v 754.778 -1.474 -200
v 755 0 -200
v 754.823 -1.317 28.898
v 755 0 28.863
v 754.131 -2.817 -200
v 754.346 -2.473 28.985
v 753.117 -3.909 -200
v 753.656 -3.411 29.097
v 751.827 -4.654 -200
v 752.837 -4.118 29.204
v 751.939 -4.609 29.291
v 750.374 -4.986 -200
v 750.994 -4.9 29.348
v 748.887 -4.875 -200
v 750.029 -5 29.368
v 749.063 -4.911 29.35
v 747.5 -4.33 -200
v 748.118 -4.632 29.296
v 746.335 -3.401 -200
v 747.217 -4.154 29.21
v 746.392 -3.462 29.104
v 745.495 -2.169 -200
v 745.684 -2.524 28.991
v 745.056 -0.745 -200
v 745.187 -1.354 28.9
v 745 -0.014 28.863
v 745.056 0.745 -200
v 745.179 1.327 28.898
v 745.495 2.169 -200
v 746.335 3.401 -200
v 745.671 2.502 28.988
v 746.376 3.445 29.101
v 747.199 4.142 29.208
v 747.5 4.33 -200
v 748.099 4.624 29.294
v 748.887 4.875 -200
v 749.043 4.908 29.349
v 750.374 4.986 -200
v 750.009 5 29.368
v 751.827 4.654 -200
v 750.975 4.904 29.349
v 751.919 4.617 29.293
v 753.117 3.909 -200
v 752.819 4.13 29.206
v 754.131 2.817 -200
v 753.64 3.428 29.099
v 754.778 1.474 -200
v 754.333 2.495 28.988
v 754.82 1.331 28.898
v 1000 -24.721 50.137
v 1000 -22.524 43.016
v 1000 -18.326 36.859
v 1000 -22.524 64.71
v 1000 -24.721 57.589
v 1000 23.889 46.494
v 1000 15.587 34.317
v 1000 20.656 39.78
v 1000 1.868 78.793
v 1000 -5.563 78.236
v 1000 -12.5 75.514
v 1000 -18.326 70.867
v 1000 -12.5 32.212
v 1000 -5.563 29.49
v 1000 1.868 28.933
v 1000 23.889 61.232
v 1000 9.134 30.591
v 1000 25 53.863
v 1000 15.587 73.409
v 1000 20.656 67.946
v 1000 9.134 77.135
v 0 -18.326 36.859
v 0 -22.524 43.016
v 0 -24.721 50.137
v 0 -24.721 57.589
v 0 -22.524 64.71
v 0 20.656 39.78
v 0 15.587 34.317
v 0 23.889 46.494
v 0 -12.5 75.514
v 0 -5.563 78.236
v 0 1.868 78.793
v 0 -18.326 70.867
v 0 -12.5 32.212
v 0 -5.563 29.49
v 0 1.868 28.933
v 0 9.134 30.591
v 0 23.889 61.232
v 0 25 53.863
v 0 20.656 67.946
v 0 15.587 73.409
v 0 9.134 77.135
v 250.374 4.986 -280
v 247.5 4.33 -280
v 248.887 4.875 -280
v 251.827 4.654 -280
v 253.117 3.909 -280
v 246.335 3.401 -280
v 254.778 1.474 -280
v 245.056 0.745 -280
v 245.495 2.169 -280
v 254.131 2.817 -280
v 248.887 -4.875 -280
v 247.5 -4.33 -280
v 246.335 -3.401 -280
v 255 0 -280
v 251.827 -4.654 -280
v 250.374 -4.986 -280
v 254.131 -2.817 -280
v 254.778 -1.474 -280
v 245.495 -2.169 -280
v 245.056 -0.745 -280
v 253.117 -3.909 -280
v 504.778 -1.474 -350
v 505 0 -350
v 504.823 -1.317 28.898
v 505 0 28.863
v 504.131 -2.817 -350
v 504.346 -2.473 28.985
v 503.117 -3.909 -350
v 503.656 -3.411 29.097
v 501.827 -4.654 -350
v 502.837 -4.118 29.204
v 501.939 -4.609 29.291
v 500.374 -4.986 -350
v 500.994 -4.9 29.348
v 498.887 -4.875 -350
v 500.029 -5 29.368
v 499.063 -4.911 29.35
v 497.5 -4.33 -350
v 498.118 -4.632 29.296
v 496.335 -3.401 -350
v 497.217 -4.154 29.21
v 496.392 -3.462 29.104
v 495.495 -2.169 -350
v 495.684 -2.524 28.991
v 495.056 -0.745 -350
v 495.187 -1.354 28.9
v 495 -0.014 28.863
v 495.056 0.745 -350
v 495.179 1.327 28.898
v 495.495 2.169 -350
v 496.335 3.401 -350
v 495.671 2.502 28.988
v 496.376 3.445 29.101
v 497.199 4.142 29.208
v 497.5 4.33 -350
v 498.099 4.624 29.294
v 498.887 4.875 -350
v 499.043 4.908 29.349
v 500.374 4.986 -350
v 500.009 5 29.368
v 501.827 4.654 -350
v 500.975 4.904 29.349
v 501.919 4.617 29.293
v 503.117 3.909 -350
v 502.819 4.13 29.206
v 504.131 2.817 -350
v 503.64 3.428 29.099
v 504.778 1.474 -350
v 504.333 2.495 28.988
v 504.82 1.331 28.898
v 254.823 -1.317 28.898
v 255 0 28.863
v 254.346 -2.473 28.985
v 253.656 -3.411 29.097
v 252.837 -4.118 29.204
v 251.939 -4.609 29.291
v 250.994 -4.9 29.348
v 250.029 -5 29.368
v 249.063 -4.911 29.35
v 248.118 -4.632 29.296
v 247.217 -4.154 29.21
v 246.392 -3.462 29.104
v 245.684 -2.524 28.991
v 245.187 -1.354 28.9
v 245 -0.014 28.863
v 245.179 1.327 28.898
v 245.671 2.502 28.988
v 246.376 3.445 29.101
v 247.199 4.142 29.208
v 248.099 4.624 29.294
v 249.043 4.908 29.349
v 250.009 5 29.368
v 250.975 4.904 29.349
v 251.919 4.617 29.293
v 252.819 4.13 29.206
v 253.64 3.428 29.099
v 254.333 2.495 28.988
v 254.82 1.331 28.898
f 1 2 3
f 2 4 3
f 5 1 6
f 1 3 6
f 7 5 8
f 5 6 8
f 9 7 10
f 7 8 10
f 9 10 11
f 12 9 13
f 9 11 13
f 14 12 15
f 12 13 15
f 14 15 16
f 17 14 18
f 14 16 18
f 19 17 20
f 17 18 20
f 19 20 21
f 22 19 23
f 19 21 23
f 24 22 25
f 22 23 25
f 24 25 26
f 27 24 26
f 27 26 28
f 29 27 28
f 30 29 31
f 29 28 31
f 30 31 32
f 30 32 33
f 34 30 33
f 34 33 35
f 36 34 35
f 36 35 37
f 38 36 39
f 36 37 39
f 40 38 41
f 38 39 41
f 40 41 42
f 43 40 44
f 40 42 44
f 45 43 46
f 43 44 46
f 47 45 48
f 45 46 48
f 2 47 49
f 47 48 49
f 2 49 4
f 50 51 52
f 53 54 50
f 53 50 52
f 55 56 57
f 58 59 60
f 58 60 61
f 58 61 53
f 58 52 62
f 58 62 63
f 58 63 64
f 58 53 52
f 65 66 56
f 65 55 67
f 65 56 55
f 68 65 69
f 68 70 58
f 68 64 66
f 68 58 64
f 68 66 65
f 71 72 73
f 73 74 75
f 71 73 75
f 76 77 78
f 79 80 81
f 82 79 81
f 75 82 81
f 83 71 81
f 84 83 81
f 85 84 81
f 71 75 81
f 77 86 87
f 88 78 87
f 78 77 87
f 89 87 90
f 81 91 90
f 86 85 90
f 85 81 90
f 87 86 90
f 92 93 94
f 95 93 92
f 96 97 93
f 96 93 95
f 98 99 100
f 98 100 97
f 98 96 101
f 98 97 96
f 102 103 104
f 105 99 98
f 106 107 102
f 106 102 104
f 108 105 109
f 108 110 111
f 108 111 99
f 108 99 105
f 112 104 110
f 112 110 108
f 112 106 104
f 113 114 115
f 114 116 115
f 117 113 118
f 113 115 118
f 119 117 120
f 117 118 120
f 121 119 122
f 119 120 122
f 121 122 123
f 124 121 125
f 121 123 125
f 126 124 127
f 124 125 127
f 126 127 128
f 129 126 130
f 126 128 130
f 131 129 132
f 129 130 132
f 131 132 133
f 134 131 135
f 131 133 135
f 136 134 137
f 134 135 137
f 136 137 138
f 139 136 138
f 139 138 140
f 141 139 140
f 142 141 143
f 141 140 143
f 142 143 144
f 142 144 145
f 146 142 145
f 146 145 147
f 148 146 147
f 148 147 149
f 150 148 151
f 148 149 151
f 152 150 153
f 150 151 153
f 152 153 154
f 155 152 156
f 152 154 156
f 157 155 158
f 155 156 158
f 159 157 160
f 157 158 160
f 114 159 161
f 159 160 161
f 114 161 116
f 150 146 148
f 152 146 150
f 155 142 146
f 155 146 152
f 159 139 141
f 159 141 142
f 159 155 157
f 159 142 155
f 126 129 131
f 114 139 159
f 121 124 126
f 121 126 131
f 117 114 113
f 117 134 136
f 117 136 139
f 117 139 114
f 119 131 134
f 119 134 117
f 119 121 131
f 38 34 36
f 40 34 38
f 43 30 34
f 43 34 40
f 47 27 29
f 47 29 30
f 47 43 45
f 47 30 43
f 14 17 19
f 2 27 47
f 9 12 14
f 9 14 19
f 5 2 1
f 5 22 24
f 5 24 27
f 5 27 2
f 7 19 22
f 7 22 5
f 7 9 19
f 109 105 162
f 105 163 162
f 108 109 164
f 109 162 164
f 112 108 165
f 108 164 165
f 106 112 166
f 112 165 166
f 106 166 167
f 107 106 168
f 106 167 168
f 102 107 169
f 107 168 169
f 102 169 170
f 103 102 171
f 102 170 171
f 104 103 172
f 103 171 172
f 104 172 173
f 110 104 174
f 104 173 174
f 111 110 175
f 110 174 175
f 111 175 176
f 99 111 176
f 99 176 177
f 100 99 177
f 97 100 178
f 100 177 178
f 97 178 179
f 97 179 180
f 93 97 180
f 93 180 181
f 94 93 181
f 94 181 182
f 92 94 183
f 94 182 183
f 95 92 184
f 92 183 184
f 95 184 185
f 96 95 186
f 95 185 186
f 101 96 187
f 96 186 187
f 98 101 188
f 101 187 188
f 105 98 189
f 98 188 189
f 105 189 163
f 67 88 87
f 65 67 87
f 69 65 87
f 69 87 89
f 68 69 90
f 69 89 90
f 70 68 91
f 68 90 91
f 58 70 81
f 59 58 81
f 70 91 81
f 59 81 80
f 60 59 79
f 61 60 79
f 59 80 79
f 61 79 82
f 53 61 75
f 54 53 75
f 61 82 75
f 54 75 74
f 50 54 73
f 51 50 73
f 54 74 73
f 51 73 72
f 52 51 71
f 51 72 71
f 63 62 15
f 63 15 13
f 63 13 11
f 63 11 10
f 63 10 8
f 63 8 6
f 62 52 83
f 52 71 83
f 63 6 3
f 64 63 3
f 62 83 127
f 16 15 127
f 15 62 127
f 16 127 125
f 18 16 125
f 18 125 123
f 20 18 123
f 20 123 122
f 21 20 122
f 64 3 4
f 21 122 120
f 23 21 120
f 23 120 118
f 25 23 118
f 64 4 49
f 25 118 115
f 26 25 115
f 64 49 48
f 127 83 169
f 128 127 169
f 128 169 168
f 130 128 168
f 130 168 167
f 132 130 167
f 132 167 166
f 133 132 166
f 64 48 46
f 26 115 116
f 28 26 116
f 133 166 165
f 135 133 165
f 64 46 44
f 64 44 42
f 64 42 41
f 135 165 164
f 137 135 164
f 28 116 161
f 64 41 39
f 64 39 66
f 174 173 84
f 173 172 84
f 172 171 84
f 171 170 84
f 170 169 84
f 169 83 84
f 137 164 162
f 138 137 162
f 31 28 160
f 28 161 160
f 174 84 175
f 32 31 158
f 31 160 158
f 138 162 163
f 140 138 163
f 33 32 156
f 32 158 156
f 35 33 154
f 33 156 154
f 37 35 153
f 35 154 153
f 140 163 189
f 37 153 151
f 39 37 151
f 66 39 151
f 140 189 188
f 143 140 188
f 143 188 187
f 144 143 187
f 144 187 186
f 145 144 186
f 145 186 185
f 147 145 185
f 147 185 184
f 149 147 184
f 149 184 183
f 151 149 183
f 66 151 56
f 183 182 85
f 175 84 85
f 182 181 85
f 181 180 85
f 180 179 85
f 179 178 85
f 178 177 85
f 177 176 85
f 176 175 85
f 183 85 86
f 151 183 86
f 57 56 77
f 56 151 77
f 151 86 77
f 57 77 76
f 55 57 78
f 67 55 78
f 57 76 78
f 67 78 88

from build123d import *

# Parameters (mm, degrees)
F0_R     = 25
F1_DEPTH = 1000
F2_R     = 5
F3_DEPTH = 50
F4_R     = 5
F5_DEPTH = 200
F6_R     = 5
F7_DEPTH = 350
F8_R     = 5
F9_DEPTH = 280


with BuildPart() as f1:
    # F0 (on Right) → F1 (new body)
    with BuildSketch(Plane.YZ):
        with Locations((0, 53.862866)):
            Circle(F0_R)
    extrude(amount=F1_DEPTH)

    # F2 (on Top) → F3 (join)
    with BuildSketch(Plane.XY):
        with Locations((500, 0)):
            Circle(F2_R)
        with Locations((250, 0)):
            Circle(F2_R)
        with Locations((750, 0)):
            Circle(F2_R)
    extrude(amount=F3_DEPTH)

    # F4 (on face) → F5 (join)
    with BuildSketch(Plane(origin=(0, 0, 0), x_dir=(1, 0, 0), z_dir=(0, 0, -1))):
        with Locations((750, 0)):
            Circle(F4_R)
    extrude(amount=F5_DEPTH)

    # F6 (on face) → F7 (join)
    with BuildSketch(Plane(origin=(0, 0, 0), x_dir=(1, 0, 0), z_dir=(0, 0, -1))):
        with Locations((500, 0)):
            Circle(F6_R)
    extrude(amount=F7_DEPTH)

    # F8 (on face) → F9 (join)
    with BuildSketch(Plane(origin=(0, 0, 0), x_dir=(1, 0, 0), z_dir=(0, 0, -1))):
        with Locations((250, 0)):
            Circle(F8_R)
    extrude(amount=F9_DEPTH)


solid = f1.part
